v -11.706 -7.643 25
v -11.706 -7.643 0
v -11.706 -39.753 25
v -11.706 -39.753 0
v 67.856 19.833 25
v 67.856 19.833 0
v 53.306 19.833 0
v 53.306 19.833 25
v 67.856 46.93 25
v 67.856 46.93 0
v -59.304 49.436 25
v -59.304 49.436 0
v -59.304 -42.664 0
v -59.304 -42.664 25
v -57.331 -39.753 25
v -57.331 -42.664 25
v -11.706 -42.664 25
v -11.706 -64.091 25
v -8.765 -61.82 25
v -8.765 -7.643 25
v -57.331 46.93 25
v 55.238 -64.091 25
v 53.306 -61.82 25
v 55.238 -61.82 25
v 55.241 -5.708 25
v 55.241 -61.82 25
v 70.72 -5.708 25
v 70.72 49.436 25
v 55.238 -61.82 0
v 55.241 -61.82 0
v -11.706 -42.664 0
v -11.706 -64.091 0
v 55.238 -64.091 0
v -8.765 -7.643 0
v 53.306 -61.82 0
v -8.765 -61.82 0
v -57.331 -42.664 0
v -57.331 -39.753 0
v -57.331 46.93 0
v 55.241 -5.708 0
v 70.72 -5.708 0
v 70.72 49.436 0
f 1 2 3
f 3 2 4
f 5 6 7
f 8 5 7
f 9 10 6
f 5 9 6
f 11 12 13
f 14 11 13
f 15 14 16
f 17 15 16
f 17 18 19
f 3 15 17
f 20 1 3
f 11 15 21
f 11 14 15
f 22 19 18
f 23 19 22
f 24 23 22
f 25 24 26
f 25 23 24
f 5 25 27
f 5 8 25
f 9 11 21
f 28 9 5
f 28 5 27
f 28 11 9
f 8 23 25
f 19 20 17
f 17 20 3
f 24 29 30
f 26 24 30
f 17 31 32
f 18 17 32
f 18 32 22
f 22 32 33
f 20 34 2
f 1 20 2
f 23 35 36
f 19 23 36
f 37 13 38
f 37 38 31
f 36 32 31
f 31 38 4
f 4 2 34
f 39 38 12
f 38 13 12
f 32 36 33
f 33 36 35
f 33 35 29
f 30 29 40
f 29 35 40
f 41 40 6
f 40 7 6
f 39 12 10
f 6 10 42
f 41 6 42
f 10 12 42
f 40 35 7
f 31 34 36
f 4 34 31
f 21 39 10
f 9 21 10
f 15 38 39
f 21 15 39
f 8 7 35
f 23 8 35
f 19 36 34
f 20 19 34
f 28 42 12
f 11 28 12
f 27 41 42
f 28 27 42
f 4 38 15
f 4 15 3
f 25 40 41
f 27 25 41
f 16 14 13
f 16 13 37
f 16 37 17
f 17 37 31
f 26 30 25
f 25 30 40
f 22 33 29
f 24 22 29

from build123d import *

# Parameters (mm, degrees)
F0_W     = 45.6249145791
F0_H     = 2.5061145425
F0_H_2   = 2.9115714133
F0_W_2   = 2.8638616204
F0_H_3   = 25.5405409262
F0_W_3   = 12.6152541488
F0_W_4   = 1.9348878413
F1_DEPTH = 25
F2_DEPTH = 25
F3_DEPTH = 25


with BuildPart() as f1:
    # F0 (on Top) → F1 (new body)
    with BuildSketch(Plane.XY):
        Polygon((-57.3309957981, 49.4364239275), (-59.3043640256, 49.4364239275), (-59.3043640256, 21.3805288076), (-59.3043640256, 8.8931322098), (-57.3309957981, 8.8931322098), (-57.3309957981, 46.9303093851), align=None)
        with Locations((-34.5185385086, 48.1833666563)):
            Rectangle(F0_W, F0_H)
        Polygon((39.7619791329, 49.4364239275), (-11.706081219, 49.4364239275), (-11.706081219, 46.9303093851), (-8.7652672082, 46.9303093851), (37.0916128159, 46.9303093851), (39.7619791329, 46.9303093851), align=None)
        Polygon((-57.3309957981, 8.8931322098), (-59.3043640256, 8.8931322098), (-59.3043640256, -42.6643118262), (-57.3309957981, -42.6643118262), (-57.3309957981, -39.752740413), (-57.3309957981, 6.6846082918), align=None)
        Polygon((70.7202106714, 49.4364239275), (39.7619791329, 49.4364239275), (39.7619791329, 46.9303093851), (67.856349051, 46.9303093851), (70.7202106714, 46.9303093851), align=None)
        with Locations((-34.5185385086, -41.2085261196)):
            Rectangle(F0_W, F0_H_2)
        Polygon((-8.7652672082, -61.8197210133), (-8.7652672082, -7.6428134926), (-11.706081219, -7.6428134926), (-11.706081219, -39.752740413), (-11.706081219, -42.6643118262), (-11.706081219, -61.8197210133), align=None)
        Polygon((70.7202106714, 46.9303093851), (67.856349051, 46.9303093851), (67.856349051, 22.3572142422), (67.856349051, 19.8326166719), (70.7202106714, 19.8326166719), align=None)
        Polygon((39.7619791329, -61.8197210133), (-8.7652672082, -61.8197210133), (-11.706081219, -61.8197210133), (-11.706081219, -64.0913546085), (55.2384853363, -64.0913546085), (55.2384853363, -61.8197210133), (53.3062070608, -61.8197210133), align=None)
        with Locations((69.2882798612, 7.0623462088)):
            Rectangle(F0_W_2, F0_H_3)
        with Locations((61.5487219766, 7.0623462088)):
            Rectangle(F0_W_3, F0_H_3)
        Polygon((53.3062070608, -23.8958857954), (53.3062070608, -61.8197210133), (55.2384853363, -61.8197210133), (55.2410949022, -61.8197210133), (55.2410949022, -5.7079242542), (53.3062070608, -5.7079242542), (53.3062070608, -20.9843106568), align=None)
        with Locations((54.2736509815, 7.0623462088)):
            Rectangle(F0_W_4, F0_H_3)
    extrude(amount=F1_DEPTH)

    # F0 (on Top) → F2 (join)
    with BuildSketch(Plane.XY):
        Polygon((-57.3309957981, 49.4364239275), (-59.3043640256, 49.4364239275), (-59.3043640256, 21.3805288076), (-59.3043640256, 8.8931322098), (-57.3309957981, 8.8931322098), (-57.3309957981, 46.9303093851), align=None)
        with Locations((-34.5185385086, 48.1833666563)):
            Rectangle(F0_W, F0_H)
        Polygon((39.7619791329, 49.4364239275), (-11.706081219, 49.4364239275), (-11.706081219, 46.9303093851), (-8.7652672082, 46.9303093851), (37.0916128159, 46.9303093851), (39.7619791329, 46.9303093851), align=None)
        Polygon((-57.3309957981, 8.8931322098), (-59.3043640256, 8.8931322098), (-59.3043640256, -42.6643118262), (-57.3309957981, -42.6643118262), (-57.3309957981, -39.752740413), (-57.3309957981, 6.6846082918), align=None)
        Polygon((70.7202106714, 49.4364239275), (39.7619791329, 49.4364239275), (39.7619791329, 46.9303093851), (67.856349051, 46.9303093851), (70.7202106714, 46.9303093851), align=None)
        with Locations((-34.5185385086, -41.2085261196)):
            Rectangle(F0_W, F0_H_2)
        Polygon((-8.7652672082, -61.8197210133), (-8.7652672082, -7.6428134926), (-11.706081219, -7.6428134926), (-11.706081219, -39.752740413), (-11.706081219, -42.6643118262), (-11.706081219, -61.8197210133), align=None)
        Polygon((70.7202106714, 46.9303093851), (67.856349051, 46.9303093851), (67.856349051, 22.3572142422), (67.856349051, 19.8326166719), (70.7202106714, 19.8326166719), align=None)
        Polygon((39.7619791329, -61.8197210133), (-8.7652672082, -61.8197210133), (-11.706081219, -61.8197210133), (-11.706081219, -64.0913546085), (55.2384853363, -64.0913546085), (55.2384853363, -61.8197210133), (53.3062070608, -61.8197210133), align=None)
        with Locations((69.2882798612, 7.0623462088)):
            Rectangle(F0_W_2, F0_H_3)
        with Locations((61.5487219766, 7.0623462088)):
            Rectangle(F0_W_3, F0_H_3)
        Polygon((53.3062070608, -23.8958857954), (53.3062070608, -61.8197210133), (55.2384853363, -61.8197210133), (55.2410949022, -61.8197210133), (55.2410949022, -5.7079242542), (53.3062070608, -5.7079242542), (53.3062070608, -20.9843106568), align=None)
        with Locations((54.2736509815, 7.0623462088)):
            Rectangle(F0_W_4, F0_H_3)
    extrude(amount=F2_DEPTH)

    # F0 (on Top) → F3 (join)
    with BuildSketch(Plane.XY):
        Polygon((-57.3309957981, 49.4364239275), (-59.3043640256, 49.4364239275), (-59.3043640256, 21.3805288076), (-59.3043640256, 8.8931322098), (-57.3309957981, 8.8931322098), (-57.3309957981, 46.9303093851), align=None)
        with Locations((-34.5185385086, 48.1833666563)):
            Rectangle(F0_W, F0_H)
        Polygon((39.7619791329, 49.4364239275), (-11.706081219, 49.4364239275), (-11.706081219, 46.9303093851), (-8.7652672082, 46.9303093851), (37.0916128159, 46.9303093851), (39.7619791329, 46.9303093851), align=None)
        Polygon((-57.3309957981, 8.8931322098), (-59.3043640256, 8.8931322098), (-59.3043640256, -42.6643118262), (-57.3309957981, -42.6643118262), (-57.3309957981, -39.752740413), (-57.3309957981, 6.6846082918), align=None)
        Polygon((70.7202106714, 49.4364239275), (39.7619791329, 49.4364239275), (39.7619791329, 46.9303093851), (67.856349051, 46.9303093851), (70.7202106714, 46.9303093851), align=None)
        with Locations((-34.5185385086, -41.2085261196)):
            Rectangle(F0_W, F0_H_2)
        Polygon((-8.7652672082, -61.8197210133), (-8.7652672082, -7.6428134926), (-11.706081219, -7.6428134926), (-11.706081219, -39.752740413), (-11.706081219, -42.6643118262), (-11.706081219, -61.8197210133), align=None)
        Polygon((70.7202106714, 46.9303093851), (67.856349051, 46.9303093851), (67.856349051, 22.3572142422), (67.856349051, 19.8326166719), (70.7202106714, 19.8326166719), align=None)
        Polygon((39.7619791329, -61.8197210133), (-8.7652672082, -61.8197210133), (-11.706081219, -61.8197210133), (-11.706081219, -64.0913546085), (55.2384853363, -64.0913546085), (55.2384853363, -61.8197210133), (53.3062070608, -61.8197210133), align=None)
        with Locations((69.2882798612, 7.0623462088)):
            Rectangle(F0_W_2, F0_H_3)
        with Locations((61.5487219766, 7.0623462088)):
            Rectangle(F0_W_3, F0_H_3)
        Polygon((53.3062070608, -23.8958857954), (53.3062070608, -61.8197210133), (55.2384853363, -61.8197210133), (55.2410949022, -61.8197210133), (55.2410949022, -5.7079242542), (53.3062070608, -5.7079242542), (53.3062070608, -20.9843106568), align=None)
        with Locations((54.2736509815, 7.0623462088)):
            Rectangle(F0_W_4, F0_H_3)
    extrude(amount=F3_DEPTH)


solid = f1.part
